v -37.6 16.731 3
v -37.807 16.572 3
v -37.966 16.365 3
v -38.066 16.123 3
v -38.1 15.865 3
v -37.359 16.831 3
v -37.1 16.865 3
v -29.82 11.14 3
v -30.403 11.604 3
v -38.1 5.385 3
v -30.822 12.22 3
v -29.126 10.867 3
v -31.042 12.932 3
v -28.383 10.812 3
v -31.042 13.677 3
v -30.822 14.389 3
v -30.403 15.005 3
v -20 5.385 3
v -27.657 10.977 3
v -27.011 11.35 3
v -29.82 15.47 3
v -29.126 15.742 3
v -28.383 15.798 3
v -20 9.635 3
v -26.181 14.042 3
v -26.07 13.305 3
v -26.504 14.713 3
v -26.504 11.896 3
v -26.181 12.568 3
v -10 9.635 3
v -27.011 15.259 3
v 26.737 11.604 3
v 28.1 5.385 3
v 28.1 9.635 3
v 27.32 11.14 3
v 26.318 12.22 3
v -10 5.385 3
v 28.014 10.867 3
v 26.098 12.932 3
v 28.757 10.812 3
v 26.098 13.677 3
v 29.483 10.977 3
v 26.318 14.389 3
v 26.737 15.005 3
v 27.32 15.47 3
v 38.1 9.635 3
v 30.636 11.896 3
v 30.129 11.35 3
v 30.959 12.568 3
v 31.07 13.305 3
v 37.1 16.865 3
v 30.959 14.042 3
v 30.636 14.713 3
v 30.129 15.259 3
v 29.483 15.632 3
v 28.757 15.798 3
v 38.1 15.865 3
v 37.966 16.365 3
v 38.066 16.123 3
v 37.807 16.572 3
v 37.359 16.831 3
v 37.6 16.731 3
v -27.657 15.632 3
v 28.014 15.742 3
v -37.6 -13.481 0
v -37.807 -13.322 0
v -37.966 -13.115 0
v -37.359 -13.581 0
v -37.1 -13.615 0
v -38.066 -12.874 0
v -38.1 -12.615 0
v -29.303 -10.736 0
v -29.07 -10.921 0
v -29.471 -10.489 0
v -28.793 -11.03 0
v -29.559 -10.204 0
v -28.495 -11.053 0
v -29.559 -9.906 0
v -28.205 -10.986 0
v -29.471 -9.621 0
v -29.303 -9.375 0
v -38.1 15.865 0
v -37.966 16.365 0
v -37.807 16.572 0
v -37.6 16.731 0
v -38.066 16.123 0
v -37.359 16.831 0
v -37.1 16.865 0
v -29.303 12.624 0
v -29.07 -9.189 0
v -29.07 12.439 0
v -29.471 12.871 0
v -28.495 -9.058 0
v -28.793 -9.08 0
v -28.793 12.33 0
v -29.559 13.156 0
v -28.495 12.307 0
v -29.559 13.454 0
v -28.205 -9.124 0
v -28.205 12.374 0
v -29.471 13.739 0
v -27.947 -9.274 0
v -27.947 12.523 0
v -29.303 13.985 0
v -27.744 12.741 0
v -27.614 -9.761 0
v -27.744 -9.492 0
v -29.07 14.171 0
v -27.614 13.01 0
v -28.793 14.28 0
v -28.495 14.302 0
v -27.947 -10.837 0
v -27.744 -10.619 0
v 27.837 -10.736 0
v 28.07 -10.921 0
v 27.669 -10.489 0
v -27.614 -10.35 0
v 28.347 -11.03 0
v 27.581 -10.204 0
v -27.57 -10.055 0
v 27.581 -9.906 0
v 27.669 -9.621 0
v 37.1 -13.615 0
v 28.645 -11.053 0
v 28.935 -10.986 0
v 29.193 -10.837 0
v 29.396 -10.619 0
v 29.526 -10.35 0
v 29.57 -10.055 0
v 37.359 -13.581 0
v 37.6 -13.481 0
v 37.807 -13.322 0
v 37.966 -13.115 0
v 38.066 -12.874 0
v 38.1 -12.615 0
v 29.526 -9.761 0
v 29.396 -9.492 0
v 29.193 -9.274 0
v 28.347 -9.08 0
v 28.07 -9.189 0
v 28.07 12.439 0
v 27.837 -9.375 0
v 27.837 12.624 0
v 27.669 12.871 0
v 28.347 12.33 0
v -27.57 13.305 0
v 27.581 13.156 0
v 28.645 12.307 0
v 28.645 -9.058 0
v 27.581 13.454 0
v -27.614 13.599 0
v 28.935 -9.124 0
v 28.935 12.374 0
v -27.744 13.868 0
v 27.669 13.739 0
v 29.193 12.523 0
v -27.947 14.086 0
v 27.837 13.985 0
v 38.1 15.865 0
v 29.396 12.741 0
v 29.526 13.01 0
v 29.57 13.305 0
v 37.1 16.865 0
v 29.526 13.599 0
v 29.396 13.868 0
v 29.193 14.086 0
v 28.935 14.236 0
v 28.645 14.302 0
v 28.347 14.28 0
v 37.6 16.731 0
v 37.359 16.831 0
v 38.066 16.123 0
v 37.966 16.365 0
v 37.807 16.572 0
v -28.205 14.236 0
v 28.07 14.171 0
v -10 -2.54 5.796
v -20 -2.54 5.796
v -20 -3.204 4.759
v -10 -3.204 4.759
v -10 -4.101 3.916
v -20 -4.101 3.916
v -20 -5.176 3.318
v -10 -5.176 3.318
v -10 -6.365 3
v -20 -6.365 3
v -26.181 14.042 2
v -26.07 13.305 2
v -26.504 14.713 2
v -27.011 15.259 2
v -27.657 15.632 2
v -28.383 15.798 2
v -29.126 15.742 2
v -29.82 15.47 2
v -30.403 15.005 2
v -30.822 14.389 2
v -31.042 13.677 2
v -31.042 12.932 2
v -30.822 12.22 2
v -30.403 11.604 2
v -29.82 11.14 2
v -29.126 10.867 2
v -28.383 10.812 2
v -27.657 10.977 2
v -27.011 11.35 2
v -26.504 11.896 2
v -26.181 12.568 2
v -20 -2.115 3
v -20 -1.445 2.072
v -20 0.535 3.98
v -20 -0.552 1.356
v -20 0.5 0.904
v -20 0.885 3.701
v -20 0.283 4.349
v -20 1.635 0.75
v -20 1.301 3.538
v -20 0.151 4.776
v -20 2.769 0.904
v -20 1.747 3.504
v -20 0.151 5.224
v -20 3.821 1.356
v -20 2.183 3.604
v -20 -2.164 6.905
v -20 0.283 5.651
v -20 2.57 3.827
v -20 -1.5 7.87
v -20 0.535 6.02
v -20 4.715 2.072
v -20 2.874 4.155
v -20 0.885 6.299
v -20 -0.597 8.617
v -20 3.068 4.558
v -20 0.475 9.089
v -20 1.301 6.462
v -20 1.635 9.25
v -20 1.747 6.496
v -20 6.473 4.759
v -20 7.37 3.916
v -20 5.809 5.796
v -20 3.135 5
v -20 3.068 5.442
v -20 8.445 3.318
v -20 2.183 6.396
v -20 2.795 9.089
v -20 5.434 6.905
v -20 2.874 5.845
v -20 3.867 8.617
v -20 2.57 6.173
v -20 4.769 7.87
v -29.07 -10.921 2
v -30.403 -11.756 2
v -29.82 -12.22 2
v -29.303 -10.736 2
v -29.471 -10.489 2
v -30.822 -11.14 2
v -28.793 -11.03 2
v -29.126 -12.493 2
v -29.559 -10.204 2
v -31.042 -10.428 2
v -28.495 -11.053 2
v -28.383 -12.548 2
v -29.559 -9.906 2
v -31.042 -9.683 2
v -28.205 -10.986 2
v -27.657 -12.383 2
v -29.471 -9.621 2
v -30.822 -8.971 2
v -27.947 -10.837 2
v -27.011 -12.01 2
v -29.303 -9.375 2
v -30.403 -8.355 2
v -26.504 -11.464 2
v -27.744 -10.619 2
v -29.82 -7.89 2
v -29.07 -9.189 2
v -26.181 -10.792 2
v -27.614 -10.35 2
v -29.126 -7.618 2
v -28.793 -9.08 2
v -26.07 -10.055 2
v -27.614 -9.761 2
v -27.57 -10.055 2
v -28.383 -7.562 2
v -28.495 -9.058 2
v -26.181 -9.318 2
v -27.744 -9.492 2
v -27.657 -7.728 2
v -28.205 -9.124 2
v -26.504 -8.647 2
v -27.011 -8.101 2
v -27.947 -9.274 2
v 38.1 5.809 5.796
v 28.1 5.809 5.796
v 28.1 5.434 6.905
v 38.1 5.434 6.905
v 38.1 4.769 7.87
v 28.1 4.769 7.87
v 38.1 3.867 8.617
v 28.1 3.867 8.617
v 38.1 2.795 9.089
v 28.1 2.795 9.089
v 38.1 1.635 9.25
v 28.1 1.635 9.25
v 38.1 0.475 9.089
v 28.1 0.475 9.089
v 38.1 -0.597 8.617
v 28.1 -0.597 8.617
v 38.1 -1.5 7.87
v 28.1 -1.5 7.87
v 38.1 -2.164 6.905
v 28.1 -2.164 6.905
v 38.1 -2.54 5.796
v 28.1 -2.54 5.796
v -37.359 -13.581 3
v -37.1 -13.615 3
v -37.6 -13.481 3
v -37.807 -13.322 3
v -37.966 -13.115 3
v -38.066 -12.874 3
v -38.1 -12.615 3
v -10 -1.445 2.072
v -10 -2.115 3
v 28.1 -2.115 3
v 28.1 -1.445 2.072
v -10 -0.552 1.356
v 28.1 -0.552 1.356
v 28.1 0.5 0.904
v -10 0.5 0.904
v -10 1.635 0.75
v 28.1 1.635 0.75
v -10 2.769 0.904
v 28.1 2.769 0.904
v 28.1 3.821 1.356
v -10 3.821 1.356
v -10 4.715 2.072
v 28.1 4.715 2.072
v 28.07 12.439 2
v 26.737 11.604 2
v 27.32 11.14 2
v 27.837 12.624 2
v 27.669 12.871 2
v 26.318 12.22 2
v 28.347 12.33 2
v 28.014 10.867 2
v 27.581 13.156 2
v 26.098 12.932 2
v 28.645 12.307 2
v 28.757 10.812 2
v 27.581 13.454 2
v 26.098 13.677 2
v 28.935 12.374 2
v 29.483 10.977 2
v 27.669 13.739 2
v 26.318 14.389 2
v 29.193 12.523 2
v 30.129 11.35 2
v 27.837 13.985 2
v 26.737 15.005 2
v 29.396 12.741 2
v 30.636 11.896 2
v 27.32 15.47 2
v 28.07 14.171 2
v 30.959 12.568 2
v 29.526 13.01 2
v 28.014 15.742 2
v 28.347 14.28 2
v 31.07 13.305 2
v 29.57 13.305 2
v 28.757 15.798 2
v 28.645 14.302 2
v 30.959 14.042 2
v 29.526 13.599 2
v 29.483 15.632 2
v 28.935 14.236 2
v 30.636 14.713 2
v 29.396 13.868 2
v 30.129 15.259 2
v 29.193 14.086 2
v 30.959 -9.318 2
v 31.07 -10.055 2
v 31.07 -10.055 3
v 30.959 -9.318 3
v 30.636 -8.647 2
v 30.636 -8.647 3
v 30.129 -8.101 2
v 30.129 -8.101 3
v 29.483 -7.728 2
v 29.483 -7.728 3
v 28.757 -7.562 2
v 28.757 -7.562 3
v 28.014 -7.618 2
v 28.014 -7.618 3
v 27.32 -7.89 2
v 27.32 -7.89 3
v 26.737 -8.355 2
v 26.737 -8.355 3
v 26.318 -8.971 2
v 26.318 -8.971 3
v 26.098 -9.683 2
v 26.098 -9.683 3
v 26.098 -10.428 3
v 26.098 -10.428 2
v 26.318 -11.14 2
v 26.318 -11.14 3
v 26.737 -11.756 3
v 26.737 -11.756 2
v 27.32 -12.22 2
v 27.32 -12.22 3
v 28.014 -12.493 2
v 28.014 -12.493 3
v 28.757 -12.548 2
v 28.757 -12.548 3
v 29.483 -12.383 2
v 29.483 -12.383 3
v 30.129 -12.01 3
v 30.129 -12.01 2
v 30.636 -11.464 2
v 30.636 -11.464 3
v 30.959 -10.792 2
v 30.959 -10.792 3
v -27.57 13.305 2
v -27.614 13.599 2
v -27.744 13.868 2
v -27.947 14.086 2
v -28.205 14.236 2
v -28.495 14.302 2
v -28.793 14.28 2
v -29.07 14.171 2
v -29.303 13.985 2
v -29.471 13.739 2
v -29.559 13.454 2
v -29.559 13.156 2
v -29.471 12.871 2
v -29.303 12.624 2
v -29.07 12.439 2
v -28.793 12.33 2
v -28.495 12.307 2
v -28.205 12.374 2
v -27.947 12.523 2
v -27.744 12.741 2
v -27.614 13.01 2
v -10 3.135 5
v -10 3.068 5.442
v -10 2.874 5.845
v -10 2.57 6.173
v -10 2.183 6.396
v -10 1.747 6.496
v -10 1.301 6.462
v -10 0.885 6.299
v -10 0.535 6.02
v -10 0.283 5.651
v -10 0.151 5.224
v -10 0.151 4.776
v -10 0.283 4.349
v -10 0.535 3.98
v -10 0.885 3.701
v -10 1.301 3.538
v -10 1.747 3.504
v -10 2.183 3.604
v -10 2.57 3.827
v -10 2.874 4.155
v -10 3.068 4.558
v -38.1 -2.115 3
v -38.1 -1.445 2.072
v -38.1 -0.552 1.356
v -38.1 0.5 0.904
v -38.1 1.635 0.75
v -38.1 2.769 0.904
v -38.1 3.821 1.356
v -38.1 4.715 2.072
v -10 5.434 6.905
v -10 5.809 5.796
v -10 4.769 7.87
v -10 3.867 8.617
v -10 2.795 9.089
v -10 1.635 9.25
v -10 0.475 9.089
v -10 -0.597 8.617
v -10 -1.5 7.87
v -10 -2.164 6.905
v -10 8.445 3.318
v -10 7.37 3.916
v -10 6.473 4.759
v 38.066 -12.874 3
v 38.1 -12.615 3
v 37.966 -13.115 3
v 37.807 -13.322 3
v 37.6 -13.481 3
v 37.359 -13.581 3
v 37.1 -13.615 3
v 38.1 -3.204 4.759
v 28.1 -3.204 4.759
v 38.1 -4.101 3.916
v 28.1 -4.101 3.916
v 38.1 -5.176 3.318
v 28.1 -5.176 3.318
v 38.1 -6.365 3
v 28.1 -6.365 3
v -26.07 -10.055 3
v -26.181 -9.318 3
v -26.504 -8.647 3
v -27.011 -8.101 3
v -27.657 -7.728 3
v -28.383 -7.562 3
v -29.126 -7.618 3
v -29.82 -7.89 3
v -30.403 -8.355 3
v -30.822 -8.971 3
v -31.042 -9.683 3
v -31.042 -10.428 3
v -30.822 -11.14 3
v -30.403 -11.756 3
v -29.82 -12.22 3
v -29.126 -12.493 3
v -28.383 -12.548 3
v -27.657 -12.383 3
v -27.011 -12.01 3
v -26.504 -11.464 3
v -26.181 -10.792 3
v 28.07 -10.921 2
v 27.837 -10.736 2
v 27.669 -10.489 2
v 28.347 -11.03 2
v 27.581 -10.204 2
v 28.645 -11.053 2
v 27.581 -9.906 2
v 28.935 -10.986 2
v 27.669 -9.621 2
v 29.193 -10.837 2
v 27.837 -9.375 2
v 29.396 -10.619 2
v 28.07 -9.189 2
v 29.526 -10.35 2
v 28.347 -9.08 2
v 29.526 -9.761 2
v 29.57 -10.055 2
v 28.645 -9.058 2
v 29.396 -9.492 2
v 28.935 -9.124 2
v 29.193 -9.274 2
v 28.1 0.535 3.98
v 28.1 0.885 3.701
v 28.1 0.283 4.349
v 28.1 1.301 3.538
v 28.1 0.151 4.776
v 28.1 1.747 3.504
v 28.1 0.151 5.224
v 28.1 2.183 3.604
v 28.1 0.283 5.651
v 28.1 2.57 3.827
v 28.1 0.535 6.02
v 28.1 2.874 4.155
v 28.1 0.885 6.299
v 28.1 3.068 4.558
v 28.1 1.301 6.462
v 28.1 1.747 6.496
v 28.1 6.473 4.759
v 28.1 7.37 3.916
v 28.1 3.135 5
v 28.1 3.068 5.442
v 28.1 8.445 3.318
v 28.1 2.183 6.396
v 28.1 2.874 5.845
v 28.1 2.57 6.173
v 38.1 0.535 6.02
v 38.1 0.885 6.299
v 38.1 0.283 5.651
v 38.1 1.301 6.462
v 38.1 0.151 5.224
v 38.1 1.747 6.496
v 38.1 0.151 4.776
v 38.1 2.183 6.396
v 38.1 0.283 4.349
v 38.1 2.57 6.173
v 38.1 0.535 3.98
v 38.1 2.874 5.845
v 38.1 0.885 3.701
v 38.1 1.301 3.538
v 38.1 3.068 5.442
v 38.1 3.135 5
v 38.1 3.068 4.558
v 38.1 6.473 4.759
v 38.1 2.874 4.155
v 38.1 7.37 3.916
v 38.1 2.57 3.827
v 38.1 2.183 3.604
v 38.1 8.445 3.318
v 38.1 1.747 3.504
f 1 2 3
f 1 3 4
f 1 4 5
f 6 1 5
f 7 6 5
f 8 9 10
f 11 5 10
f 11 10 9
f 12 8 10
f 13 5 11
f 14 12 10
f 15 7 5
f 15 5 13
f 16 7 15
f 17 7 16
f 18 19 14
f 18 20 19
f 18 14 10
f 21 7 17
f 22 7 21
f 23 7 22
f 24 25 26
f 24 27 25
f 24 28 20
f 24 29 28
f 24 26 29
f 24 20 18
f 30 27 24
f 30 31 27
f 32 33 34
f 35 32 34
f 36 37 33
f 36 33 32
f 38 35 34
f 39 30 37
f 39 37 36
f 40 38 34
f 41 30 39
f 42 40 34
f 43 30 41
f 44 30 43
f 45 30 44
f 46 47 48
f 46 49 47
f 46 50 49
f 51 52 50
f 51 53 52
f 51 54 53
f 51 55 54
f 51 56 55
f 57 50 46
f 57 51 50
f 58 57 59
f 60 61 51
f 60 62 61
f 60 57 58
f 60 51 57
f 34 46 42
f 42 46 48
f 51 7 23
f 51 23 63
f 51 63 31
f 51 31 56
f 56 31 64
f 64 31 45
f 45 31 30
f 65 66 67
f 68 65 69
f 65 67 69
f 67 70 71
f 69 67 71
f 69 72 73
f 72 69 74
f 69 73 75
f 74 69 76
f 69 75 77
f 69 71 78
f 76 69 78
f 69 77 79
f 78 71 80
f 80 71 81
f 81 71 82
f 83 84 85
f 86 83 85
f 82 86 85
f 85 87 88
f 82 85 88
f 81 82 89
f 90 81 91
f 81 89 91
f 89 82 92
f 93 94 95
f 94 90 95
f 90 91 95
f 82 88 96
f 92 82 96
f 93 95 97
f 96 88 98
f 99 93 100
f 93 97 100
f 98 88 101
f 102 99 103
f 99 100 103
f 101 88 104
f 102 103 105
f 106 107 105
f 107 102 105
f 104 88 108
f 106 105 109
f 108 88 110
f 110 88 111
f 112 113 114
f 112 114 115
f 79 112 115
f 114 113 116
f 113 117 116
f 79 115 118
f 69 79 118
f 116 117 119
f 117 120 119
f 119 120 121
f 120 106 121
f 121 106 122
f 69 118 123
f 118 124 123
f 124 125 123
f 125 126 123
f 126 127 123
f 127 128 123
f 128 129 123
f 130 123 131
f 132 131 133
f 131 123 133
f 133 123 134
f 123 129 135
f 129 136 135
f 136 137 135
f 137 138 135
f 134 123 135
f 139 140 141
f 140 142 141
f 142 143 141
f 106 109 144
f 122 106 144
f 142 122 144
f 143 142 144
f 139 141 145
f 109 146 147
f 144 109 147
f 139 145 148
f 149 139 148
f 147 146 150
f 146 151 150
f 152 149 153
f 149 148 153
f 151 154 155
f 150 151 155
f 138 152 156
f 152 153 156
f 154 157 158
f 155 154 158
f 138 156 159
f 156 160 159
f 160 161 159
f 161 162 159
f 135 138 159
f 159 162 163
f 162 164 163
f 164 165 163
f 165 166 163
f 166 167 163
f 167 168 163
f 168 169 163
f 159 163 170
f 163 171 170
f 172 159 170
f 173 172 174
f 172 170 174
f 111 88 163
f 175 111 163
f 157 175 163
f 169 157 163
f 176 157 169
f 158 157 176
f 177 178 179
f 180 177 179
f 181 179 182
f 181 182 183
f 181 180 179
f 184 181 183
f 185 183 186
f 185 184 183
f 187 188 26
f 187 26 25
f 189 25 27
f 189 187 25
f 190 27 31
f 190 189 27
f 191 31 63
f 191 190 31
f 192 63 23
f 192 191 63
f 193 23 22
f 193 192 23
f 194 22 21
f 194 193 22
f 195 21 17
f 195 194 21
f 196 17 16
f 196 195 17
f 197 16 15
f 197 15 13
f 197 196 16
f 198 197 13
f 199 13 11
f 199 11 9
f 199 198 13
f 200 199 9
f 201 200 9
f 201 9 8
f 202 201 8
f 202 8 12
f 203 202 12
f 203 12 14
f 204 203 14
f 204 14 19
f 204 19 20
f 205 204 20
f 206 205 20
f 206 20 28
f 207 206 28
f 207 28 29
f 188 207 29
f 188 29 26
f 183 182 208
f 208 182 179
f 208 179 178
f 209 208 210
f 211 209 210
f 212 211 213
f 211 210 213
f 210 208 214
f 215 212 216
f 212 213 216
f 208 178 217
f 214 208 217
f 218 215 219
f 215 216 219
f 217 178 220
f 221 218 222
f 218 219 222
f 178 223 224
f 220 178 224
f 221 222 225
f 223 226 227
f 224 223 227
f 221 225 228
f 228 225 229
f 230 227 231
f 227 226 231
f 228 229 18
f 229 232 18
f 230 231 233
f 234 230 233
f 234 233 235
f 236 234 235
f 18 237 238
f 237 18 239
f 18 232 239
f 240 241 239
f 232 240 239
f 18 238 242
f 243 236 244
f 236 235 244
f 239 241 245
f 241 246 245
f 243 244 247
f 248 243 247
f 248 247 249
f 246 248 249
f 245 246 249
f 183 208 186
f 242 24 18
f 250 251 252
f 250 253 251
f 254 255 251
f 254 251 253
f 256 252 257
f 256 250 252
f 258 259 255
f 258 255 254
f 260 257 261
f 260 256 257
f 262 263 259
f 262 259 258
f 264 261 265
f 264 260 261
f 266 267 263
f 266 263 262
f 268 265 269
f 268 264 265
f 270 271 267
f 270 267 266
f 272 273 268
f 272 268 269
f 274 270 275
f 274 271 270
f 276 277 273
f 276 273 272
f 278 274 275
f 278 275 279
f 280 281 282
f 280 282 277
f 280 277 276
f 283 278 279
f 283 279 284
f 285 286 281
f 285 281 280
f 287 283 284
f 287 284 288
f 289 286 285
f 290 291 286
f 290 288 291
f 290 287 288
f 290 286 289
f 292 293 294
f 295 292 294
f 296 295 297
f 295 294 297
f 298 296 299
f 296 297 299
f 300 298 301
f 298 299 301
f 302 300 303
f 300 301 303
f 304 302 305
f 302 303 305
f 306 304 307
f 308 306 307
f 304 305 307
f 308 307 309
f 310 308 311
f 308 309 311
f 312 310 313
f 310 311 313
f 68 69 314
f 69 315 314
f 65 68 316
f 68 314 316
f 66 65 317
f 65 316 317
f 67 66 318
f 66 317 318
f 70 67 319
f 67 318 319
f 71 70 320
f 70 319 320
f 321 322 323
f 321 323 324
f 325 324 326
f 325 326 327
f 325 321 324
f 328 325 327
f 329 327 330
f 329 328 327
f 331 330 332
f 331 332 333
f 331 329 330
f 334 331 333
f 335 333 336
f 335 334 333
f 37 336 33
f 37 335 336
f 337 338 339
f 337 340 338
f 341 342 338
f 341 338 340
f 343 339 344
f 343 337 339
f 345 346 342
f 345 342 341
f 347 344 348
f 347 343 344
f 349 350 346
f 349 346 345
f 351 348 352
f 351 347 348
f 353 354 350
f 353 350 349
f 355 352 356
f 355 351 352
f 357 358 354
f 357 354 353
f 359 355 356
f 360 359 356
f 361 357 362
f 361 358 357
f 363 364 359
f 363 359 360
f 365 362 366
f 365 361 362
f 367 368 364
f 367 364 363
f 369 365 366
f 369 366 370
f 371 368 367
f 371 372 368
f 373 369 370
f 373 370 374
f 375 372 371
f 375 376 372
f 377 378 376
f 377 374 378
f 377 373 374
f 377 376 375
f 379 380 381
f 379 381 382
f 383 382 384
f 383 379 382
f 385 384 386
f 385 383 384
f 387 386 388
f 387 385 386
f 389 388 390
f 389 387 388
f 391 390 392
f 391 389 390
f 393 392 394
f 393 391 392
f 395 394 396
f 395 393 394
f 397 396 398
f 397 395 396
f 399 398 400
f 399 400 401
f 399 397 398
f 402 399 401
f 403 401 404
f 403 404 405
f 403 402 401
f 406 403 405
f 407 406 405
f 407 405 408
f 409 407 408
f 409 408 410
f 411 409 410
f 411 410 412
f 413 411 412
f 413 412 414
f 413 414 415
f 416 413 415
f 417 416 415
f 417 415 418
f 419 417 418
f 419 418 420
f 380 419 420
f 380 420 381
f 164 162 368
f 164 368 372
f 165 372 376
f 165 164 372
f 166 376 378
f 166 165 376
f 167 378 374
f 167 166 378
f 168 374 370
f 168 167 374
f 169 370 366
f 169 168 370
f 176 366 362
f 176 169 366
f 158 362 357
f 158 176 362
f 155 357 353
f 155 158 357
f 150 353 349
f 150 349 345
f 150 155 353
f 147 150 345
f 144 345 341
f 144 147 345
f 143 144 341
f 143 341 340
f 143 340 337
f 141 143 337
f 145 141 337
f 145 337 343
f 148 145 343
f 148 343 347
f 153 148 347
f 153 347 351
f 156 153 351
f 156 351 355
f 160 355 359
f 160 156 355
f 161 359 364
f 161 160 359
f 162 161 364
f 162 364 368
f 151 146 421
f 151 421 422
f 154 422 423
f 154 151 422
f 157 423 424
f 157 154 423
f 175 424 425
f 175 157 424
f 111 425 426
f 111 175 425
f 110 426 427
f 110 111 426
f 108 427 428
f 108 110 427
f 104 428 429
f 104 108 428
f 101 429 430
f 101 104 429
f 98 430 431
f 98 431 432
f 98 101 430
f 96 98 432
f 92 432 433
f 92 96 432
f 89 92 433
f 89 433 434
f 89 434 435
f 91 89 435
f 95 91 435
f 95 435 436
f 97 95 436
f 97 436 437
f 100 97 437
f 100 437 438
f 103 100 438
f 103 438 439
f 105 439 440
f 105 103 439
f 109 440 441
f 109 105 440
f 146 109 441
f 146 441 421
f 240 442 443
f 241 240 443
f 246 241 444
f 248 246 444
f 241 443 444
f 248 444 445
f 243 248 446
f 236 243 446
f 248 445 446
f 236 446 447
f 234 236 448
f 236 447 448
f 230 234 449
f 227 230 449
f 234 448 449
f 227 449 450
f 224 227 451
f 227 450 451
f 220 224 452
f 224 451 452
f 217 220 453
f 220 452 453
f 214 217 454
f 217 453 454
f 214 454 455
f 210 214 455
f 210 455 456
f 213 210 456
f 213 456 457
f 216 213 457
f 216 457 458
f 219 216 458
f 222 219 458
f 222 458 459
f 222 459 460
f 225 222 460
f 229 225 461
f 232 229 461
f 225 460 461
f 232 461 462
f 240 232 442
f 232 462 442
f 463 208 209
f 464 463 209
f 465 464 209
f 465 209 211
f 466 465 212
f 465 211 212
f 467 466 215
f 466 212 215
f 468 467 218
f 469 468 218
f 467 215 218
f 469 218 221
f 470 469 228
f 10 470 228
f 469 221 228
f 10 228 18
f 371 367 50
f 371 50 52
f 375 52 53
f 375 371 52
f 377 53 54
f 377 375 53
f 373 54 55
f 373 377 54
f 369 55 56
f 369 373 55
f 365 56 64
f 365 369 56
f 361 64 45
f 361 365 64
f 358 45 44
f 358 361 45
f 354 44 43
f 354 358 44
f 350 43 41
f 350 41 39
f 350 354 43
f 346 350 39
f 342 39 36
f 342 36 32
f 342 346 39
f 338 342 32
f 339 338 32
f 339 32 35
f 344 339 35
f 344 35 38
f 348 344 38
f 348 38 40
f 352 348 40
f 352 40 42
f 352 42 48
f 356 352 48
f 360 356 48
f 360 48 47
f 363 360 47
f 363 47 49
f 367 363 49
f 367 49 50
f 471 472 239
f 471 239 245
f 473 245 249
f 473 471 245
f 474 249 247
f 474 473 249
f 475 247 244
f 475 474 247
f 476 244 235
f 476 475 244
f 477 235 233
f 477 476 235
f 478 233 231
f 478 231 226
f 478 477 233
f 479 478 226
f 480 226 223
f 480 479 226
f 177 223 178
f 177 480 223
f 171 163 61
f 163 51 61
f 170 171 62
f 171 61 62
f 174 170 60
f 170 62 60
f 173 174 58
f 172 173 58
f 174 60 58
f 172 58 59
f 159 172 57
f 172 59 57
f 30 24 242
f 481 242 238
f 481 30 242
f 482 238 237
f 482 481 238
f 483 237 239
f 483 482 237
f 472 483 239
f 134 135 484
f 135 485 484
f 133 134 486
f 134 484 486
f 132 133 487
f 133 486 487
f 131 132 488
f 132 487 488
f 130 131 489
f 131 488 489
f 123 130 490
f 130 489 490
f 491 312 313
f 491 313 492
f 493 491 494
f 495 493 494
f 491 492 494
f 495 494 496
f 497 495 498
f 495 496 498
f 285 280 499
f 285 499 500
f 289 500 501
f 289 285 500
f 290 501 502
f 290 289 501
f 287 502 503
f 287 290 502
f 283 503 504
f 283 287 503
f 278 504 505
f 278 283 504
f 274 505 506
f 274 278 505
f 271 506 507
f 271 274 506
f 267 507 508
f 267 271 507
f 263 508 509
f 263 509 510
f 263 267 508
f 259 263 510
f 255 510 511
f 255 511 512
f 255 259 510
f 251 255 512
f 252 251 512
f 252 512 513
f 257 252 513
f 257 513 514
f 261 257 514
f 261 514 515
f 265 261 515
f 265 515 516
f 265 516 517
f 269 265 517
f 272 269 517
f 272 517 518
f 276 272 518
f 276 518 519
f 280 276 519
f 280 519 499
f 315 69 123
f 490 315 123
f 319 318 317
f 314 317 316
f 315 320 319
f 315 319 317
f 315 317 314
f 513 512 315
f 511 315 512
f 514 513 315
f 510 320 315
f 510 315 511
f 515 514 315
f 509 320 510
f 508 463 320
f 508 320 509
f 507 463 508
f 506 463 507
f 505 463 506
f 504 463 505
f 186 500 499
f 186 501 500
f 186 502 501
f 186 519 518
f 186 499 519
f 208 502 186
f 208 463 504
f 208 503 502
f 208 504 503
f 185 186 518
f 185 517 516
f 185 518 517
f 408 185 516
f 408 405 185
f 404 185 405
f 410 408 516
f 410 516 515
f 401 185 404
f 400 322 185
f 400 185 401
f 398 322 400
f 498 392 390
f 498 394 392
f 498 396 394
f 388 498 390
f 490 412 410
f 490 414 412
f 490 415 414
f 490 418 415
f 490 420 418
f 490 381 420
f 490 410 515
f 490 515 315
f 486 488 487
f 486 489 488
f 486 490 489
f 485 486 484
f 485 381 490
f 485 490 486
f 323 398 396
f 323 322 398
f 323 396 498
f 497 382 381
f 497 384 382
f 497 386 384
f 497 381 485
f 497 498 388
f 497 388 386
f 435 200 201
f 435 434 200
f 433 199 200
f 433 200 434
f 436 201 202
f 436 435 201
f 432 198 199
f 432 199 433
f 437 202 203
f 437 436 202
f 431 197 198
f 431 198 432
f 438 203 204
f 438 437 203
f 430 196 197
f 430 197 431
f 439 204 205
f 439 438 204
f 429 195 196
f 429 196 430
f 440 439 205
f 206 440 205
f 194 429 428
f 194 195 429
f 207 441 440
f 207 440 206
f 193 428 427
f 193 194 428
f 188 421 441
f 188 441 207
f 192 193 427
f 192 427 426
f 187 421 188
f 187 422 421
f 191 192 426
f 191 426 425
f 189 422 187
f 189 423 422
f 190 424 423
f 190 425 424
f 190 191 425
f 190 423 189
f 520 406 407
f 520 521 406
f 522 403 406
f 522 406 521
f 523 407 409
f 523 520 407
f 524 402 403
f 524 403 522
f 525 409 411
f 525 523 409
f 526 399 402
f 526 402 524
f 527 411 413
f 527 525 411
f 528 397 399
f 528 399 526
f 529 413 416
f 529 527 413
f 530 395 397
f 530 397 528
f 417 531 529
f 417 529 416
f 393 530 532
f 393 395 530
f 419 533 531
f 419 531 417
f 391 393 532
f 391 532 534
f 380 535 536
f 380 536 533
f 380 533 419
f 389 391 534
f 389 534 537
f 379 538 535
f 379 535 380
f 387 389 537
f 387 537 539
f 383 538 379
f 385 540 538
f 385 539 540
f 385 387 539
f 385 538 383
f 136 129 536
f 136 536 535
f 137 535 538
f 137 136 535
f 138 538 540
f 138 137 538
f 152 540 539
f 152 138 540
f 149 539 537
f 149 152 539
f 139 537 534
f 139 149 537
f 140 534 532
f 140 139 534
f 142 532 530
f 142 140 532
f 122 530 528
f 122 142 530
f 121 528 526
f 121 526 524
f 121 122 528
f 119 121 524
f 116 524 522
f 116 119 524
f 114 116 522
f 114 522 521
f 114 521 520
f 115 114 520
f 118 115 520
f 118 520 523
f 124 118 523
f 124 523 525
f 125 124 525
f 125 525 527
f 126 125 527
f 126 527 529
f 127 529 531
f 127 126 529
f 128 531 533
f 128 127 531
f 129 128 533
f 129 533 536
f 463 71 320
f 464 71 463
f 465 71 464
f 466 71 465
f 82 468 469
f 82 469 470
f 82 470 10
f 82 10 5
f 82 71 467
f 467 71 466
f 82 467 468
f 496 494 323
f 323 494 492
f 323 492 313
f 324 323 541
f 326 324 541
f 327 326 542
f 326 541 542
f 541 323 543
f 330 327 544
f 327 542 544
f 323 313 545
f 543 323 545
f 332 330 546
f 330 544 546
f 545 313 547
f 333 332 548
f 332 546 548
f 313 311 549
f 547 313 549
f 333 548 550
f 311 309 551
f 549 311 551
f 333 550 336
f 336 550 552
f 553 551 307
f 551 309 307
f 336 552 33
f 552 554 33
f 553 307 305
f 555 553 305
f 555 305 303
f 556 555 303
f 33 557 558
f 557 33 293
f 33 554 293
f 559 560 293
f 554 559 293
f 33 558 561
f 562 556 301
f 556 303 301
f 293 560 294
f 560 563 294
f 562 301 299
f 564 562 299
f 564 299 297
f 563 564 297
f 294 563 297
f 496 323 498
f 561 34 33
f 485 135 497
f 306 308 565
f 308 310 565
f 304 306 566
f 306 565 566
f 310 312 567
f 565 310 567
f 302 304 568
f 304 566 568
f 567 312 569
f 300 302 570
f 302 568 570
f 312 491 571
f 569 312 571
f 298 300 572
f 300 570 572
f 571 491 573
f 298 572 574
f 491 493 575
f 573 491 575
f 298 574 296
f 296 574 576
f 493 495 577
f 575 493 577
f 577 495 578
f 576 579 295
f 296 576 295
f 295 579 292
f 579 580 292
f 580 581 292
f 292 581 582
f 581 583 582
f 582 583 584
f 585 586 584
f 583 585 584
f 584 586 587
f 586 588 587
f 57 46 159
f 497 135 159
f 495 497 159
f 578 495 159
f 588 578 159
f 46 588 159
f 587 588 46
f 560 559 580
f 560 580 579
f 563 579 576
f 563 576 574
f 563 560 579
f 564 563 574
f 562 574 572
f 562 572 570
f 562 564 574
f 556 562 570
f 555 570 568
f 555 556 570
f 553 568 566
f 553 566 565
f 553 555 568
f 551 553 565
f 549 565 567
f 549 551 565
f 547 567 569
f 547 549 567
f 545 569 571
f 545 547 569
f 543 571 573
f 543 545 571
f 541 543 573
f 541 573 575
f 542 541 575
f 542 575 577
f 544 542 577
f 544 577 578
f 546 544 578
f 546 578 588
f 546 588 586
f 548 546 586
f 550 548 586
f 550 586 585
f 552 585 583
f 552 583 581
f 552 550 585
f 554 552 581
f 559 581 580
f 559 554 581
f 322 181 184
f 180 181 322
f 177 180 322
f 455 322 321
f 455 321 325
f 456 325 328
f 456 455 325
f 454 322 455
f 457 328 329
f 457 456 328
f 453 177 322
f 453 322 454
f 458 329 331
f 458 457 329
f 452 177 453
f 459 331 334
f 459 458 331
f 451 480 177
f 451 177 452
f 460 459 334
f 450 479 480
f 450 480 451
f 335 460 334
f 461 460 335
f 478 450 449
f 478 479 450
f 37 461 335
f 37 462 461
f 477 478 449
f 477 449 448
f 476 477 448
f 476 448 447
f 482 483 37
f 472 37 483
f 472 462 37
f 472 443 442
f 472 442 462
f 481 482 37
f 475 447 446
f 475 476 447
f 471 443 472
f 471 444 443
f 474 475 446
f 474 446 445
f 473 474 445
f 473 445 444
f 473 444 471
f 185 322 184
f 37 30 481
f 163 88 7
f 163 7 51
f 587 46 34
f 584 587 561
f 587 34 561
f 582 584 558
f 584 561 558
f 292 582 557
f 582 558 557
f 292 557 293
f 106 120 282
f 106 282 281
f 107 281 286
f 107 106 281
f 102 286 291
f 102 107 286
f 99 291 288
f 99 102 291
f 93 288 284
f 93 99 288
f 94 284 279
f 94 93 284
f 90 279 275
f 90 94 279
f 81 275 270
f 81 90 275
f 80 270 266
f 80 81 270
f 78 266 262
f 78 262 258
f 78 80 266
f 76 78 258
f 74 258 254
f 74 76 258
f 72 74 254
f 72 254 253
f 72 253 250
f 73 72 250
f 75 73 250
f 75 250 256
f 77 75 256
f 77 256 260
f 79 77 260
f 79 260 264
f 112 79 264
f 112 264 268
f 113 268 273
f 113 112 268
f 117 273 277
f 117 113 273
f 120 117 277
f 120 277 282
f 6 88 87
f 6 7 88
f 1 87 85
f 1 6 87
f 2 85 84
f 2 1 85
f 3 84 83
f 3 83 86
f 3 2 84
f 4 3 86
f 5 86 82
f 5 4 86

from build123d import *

# Parameters (mm, degrees)
F0_W          = 76.2
F0_H          = 30.48
F0_R          = 2.5
F2_DEPTH      = 3
F0_R_2        = 1
F3_DEPTH      = 2
F4_START      = 28.1
F1_R          = 1.5
F4_DEPTH      = 10
F5_START      = -10
F5_DEPTH      = 10
F6_DEPTH      = 10
F6_DEPTH_BACK = 28.1
F7_R          = 1
F8_START      = -20
F8_DEPTH      = 30


with BuildPart() as f2:
    # F0 (on Top) → F2 (new body)
    with BuildSketch(Plane.XY):
        with Locations((0, 1.624652555)):
            Rectangle(F0_W, F0_H)
        with Locations((-28.57, -10.055347445)):
            Circle(F0_R, mode=Mode.SUBTRACT)
        with Locations((28.57, -10.055347445)):
            Circle(F0_R, mode=Mode.SUBTRACT)
        with Locations((-28.57, 13.304652555)):
            Circle(F0_R, mode=Mode.SUBTRACT)
        with Locations((28.57, 13.304652555)):
            Circle(F0_R, mode=Mode.SUBTRACT)
    extrude(amount=F2_DEPTH)

    # F0 (on Top) → F3 (join)
    with BuildSketch(Plane.XY):
        with Locations((28.57, 13.304652555)):
            Circle(F0_R)
        with Locations((28.57, 13.304652555)):
            Circle(F0_R_2, mode=Mode.SUBTRACT)
        with Locations((28.57, -10.055347445)):
            Circle(F0_R)
        with Locations((28.57, -10.055347445)):
            Circle(F0_R_2, mode=Mode.SUBTRACT)
        with Locations((-28.57, -10.055347445)):
            Circle(F0_R)
        with Locations((-28.57, -10.055347445)):
            Circle(F0_R_2, mode=Mode.SUBTRACT)
        with Locations((-28.57, 13.304652555)):
            Circle(F0_R)
        with Locations((-28.57, 13.304652555)):
            Circle(F0_R_2, mode=Mode.SUBTRACT)
    extrude(amount=F3_DEPTH)

    # F1 (on Right) → F4 (join)
    with BuildSketch(Plane.YZ.offset(F4_START)):
        with BuildLine():
            ThreePointArc((-2.5401260508, 5.7960675804), (-4.1005061168, 3.9161569732), (-6.365347445, 3))
            Line((-6.365347445, 3), (-2.115347445, 3))
            ThreePointArc((-2.115347445, 3), (-2.5671360482, 4.3616642469), (-2.5401260508, 5.7960675804))
        make_face()
        with BuildLine():
            Line((5.384652555, 3), (9.634652555, 3))
            ThreePointArc((9.634652555, 3), (7.3698112268, 3.9161569732), (5.8094311608, 5.7960675804))
            ThreePointArc((5.8094311608, 5.7960675804), (5.8658054165, 5.3998067817), (5.884652555, 5))
            ThreePointArc((5.884652555, 5), (5.7577581806, 3.9692235936), (5.384652555, 3))
        make_face()
        with BuildLine():
            ThreePointArc((-2.5401260508, 5.7960675804), (-2.5671360482, 4.3616642469), (-2.115347445, 3))
            Line((-2.115347445, 3), (5.384652555, 3))
            ThreePointArc((5.384652555, 3), (5.7577581806, 3.9692235936), (5.884652555, 5))
            ThreePointArc((5.884652555, 5), (5.8658054165, 5.3998067817), (5.8094311608, 5.7960675804))
            ThreePointArc((5.8094311608, 5.7960675804), (1.634652555, 9.25), (-2.5401260508, 5.7960675804))
        make_face()
        with Locations((1.634652555, 5)):
            Circle(F1_R, mode=Mode.SUBTRACT)
    extrude(amount=F4_DEPTH)

    # F1 (on Right) → F5 (join)
    with BuildSketch(Plane.YZ.offset(F5_START)):
        with BuildLine():
            ThreePointArc((-2.5401260508, 5.7960675804), (-4.1005061168, 3.9161569732), (-6.365347445, 3))
            Line((-6.365347445, 3), (-2.115347445, 3))
            ThreePointArc((-2.115347445, 3), (-2.5671360482, 4.3616642469), (-2.5401260508, 5.7960675804))
        make_face()
        with BuildLine():
            Line((5.384652555, 3), (9.634652555, 3))
            ThreePointArc((9.634652555, 3), (7.3698112268, 3.9161569732), (5.8094311608, 5.7960675804))
            ThreePointArc((5.8094311608, 5.7960675804), (5.8658054165, 5.3998067817), (5.884652555, 5))
            ThreePointArc((5.884652555, 5), (5.7577581806, 3.9692235936), (5.384652555, 3))
        make_face()
        with BuildLine():
            ThreePointArc((-2.5401260508, 5.7960675804), (-2.5671360482, 4.3616642469), (-2.115347445, 3))
            Line((-2.115347445, 3), (5.384652555, 3))
            ThreePointArc((5.384652555, 3), (5.7577581806, 3.9692235936), (5.884652555, 5))
            ThreePointArc((5.884652555, 5), (5.8658054165, 5.3998067817), (5.8094311608, 5.7960675804))
            ThreePointArc((5.8094311608, 5.7960675804), (1.634652555, 9.25), (-2.5401260508, 5.7960675804))
        make_face()
        with Locations((1.634652555, 5)):
            Circle(F1_R, mode=Mode.SUBTRACT)
    extrude(amount=-F5_DEPTH)

    # F1 (on Right) → F6 (cut, two sides)
    with BuildSketch(Plane.YZ) as f6_sk:
        with BuildLine():
            Line((5.384652555, 3), (-2.115347445, 3))
            ThreePointArc((-2.115347445, 3), (1.634652555, 0.75), (5.384652555, 3))
        make_face()
    extrude(amount=-F6_DEPTH, mode=Mode.SUBTRACT)
    extrude(f6_sk.sketch, amount=F6_DEPTH_BACK, mode=Mode.SUBTRACT)

    # F7
    f7_edges = [f2.edges().sort_by_distance(p)[0] for p in [
        (38.1, -13.615347, 1.5),
        (38.1, 16.864653, 1.5),
        (-38.1, 16.864653, 1.5),
        (-38.1, -13.615347, 1.5),
    ]]
    fillet(f7_edges, radius=F7_R)

    # F1 (on Right) → F8 (cut)
    with BuildSketch(Plane.YZ.offset(F8_START)):
        with BuildLine():
            ThreePointArc((-2.5401260508, 5.7960675804), (-2.5671360482, 4.3616642469), (-2.115347445, 3))
            Line((-2.115347445, 3), (5.384652555, 3))
            ThreePointArc((5.384652555, 3), (5.7577581806, 3.9692235936), (5.884652555, 5))
            ThreePointArc((5.884652555, 5), (5.8658054165, 5.3998067817), (5.8094311608, 5.7960675804))
            ThreePointArc((5.8094311608, 5.7960675804), (1.634652555, 9.25), (-2.5401260508, 5.7960675804))
        make_face()
        with Locations((1.634652555, 5)):
            Circle(F1_R, mode=Mode.SUBTRACT)
        with BuildLine():
            Line((5.384652555, 3), (-2.115347445, 3))
            ThreePointArc((-2.115347445, 3), (1.634652555, 0.75), (5.384652555, 3))
        make_face()
    extrude(amount=-F8_DEPTH, mode=Mode.SUBTRACT)


solid = f2.part
